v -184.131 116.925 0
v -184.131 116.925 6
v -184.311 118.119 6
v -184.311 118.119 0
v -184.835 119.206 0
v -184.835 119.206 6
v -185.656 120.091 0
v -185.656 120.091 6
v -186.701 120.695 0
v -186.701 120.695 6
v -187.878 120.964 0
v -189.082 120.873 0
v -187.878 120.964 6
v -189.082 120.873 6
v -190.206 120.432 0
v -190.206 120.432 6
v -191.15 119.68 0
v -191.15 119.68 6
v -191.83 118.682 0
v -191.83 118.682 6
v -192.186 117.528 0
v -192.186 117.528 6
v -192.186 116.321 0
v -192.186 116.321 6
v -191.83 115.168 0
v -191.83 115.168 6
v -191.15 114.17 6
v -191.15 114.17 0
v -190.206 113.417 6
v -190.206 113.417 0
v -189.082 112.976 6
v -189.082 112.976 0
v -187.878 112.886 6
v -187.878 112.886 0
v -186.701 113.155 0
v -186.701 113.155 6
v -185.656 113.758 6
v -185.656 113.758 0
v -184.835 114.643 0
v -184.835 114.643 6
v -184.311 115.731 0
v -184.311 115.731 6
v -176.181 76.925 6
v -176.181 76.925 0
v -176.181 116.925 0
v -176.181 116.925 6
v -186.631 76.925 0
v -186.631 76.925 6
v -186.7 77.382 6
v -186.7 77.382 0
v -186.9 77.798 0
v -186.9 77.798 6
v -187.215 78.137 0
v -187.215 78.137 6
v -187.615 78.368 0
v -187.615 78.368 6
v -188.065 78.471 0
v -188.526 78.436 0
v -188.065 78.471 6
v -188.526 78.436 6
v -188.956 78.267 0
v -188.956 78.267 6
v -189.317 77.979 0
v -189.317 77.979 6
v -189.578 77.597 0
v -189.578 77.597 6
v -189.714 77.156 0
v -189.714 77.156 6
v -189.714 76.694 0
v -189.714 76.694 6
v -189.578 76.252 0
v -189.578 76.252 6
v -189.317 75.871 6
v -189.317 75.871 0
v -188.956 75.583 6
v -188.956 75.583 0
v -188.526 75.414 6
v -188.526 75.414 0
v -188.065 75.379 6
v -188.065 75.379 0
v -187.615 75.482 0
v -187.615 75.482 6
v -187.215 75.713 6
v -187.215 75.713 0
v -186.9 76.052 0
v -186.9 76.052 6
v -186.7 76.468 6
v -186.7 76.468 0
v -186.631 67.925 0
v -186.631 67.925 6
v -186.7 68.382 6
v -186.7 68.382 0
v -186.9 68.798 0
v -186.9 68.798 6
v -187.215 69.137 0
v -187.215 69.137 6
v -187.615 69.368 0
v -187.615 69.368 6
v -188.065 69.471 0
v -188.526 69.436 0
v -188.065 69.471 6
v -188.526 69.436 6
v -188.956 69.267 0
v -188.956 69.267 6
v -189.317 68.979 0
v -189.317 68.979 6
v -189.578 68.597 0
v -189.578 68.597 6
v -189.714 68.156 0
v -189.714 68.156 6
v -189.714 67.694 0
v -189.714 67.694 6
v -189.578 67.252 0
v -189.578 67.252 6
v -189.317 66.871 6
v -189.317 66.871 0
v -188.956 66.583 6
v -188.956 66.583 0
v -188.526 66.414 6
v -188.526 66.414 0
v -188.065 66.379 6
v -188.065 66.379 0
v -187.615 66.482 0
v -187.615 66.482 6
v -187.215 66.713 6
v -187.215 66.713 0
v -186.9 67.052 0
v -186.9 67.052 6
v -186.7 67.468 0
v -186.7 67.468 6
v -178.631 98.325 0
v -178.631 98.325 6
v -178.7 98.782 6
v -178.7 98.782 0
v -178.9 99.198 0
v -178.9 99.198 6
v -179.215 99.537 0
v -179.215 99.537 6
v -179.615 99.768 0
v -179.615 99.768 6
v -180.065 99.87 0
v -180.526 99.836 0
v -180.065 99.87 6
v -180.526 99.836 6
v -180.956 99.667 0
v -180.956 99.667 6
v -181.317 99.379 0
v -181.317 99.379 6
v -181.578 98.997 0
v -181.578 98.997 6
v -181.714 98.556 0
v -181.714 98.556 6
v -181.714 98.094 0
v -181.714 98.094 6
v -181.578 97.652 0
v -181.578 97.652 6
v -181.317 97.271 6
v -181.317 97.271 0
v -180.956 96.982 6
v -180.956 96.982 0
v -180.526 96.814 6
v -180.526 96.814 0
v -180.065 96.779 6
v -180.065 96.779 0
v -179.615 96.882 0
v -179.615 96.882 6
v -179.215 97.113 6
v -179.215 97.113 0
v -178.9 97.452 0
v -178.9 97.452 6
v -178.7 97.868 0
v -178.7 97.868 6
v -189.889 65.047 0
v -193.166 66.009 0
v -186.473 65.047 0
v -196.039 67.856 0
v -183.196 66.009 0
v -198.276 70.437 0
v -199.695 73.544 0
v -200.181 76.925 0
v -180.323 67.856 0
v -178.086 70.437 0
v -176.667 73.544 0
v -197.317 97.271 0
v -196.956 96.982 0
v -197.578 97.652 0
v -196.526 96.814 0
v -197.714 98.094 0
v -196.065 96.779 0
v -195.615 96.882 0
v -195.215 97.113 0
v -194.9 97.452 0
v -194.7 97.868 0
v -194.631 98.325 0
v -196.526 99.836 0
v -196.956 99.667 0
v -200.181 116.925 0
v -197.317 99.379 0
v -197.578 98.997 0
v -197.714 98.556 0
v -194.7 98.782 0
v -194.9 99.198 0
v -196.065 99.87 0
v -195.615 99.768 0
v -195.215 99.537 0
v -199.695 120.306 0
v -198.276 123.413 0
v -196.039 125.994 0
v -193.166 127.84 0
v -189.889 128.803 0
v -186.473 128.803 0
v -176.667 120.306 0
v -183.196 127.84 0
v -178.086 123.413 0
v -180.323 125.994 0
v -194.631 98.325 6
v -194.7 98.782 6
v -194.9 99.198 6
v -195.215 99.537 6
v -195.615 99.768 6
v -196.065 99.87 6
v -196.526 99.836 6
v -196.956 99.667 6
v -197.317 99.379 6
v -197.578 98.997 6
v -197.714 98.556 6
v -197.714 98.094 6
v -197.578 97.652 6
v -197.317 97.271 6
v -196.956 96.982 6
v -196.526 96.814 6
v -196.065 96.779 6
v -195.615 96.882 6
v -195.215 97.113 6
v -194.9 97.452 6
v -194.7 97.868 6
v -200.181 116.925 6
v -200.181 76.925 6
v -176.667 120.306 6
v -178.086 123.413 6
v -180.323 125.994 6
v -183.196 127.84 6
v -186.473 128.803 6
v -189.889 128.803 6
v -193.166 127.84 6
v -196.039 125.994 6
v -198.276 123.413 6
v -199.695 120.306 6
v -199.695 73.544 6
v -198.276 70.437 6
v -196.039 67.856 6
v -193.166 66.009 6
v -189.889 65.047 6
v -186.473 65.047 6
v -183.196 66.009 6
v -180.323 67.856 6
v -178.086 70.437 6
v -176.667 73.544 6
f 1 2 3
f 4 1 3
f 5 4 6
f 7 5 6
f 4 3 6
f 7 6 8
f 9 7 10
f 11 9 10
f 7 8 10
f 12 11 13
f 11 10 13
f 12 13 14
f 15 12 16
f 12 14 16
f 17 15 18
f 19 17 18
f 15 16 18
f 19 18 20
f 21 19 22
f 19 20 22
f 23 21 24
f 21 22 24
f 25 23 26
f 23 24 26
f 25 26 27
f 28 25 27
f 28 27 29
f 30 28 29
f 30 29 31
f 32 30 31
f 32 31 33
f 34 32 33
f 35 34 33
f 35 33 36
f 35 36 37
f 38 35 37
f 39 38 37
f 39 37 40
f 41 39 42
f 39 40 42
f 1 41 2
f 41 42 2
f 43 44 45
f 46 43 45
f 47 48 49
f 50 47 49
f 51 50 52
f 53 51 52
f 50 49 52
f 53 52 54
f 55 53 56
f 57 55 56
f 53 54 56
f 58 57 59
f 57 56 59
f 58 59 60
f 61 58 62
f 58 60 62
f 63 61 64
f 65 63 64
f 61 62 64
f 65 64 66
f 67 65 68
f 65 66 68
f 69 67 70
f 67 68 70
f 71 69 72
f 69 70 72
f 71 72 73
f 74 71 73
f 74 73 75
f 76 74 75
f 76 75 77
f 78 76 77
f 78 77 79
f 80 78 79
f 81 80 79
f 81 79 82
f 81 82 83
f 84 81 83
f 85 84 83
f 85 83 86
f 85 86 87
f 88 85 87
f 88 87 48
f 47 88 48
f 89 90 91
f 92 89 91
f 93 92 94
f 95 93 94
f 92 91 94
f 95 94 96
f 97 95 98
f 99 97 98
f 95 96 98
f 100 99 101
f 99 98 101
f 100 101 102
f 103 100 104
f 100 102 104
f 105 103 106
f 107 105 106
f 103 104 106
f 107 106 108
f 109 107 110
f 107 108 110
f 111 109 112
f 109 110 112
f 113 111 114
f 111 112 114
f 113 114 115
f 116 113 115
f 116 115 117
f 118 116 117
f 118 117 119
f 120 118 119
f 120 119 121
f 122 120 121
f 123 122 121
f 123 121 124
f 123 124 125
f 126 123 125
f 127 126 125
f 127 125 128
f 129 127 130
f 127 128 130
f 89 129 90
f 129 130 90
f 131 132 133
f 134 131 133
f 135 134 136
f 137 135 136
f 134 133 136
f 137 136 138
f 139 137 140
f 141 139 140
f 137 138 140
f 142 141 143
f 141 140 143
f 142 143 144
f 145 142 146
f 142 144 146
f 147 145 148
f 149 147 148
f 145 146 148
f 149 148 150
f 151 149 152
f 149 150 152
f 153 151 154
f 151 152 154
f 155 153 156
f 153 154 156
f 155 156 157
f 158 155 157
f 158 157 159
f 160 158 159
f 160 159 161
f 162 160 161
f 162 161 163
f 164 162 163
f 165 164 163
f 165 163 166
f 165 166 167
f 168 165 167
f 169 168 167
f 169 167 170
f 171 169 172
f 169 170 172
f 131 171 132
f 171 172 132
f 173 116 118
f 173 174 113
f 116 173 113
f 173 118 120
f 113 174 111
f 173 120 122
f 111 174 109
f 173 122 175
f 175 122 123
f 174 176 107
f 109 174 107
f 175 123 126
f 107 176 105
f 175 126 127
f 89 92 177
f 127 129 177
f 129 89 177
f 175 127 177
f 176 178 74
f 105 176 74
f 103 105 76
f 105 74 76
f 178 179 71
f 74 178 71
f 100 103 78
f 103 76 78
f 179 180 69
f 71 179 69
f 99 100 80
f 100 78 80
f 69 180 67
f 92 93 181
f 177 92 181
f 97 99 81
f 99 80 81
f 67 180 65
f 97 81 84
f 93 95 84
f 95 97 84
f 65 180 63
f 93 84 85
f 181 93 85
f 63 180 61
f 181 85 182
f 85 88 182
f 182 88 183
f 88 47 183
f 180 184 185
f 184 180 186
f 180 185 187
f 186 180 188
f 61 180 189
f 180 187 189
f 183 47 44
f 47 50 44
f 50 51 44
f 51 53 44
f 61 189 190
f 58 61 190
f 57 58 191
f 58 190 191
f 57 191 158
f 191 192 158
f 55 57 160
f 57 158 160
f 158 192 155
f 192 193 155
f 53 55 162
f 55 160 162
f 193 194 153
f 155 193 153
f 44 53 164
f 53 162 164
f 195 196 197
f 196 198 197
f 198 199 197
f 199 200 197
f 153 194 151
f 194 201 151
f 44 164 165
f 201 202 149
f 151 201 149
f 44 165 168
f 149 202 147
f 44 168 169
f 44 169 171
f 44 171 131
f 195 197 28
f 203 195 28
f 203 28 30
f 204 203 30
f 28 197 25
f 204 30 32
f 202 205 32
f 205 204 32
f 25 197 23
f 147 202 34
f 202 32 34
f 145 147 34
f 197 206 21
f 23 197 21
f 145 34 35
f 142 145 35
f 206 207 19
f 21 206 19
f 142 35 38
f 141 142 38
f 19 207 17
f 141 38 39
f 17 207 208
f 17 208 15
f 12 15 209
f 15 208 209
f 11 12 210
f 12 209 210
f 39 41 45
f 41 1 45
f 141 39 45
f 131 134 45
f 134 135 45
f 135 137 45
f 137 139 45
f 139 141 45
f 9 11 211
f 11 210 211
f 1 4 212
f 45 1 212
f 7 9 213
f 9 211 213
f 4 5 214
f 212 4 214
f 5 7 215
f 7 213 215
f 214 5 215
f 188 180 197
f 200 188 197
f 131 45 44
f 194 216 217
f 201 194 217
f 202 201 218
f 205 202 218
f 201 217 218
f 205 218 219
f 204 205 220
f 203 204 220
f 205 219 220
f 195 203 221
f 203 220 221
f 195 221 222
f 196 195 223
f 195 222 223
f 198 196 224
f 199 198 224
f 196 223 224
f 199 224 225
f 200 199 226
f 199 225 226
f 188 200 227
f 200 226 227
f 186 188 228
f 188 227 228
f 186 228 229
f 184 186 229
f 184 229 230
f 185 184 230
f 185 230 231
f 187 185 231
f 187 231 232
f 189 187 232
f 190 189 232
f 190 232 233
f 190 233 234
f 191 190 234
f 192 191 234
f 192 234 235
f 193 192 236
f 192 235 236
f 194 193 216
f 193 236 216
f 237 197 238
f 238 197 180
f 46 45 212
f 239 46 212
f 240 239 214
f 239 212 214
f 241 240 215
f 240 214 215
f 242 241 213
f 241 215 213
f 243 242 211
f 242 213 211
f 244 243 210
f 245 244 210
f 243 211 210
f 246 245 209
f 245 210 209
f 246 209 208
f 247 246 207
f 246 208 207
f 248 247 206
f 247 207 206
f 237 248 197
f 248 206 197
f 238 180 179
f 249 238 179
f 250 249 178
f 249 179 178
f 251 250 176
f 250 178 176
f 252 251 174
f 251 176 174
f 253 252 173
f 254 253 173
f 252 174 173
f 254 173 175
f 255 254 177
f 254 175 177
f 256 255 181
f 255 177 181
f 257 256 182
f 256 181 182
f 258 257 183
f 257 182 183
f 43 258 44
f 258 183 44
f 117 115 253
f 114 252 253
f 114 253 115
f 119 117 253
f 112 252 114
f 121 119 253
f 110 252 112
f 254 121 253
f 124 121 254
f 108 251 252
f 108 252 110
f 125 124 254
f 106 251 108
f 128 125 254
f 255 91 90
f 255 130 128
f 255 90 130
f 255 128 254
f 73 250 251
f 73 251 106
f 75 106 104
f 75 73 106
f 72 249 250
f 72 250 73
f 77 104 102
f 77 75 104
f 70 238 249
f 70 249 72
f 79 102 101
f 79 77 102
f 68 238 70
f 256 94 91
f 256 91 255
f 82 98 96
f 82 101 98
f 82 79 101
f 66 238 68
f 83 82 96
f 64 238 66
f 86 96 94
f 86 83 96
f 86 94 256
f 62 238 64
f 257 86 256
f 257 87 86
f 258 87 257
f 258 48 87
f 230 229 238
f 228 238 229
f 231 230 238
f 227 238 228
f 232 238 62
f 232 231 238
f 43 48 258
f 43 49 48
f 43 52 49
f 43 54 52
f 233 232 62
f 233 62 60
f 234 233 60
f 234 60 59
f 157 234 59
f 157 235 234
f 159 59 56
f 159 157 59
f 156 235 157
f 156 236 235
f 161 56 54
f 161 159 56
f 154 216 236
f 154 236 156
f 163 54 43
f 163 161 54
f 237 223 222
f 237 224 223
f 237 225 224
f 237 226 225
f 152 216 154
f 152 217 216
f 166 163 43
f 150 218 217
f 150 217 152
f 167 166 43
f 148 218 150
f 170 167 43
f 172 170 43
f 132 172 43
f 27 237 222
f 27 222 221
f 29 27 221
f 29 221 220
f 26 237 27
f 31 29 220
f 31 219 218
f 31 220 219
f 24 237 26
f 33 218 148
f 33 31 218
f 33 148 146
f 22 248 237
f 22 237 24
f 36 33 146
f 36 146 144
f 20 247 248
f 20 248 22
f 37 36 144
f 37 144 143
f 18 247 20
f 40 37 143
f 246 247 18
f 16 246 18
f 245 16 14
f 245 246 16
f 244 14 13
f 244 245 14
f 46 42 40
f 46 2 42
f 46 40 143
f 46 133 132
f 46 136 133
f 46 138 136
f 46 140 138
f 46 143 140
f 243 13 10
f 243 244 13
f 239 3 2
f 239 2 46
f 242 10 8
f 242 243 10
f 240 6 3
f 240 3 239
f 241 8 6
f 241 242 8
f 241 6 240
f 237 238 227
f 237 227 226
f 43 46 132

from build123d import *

# Parameters (mm, degrees)
DODANIE_WYCI_GNI_CIE1_DEPTH = 6
SZKIC2_R                    = 1.55
WYTNIJ_WYCI_GNI_CIE1_DEPTH  = 6
SZKIC5_R                    = 4.05
WYTNIJ_WYCI_GNI_CIE3_DEPTH  = 6
SZKIC7_R                    = 1.55
WYTNIJ_WYCI_GNI_CIE5_DEPTH  = 10


with BuildPart() as part:
    # Szkic1 → Dodanie-wyciągnięcie1 (new body)
    with BuildSketch(Plane.XY):
        with BuildLine():
            Line((-200.181077779, 116.924844228), (-200.181077779, 76.924846477))
            ThreePointArc((-200.181077779, 76.924846477), (-188.181077779, 64.924846477), (-176.181077779, 76.924846477))
            Line((-176.181077779, 76.924846477), (-176.181077779, 116.924844163))
            ThreePointArc((-176.181077779, 116.924844163), (-188.181077747, 128.924846477), (-200.181077779, 116.924844228))
        make_face()
    extrude(amount=DODANIE_WYCI_GNI_CIE1_DEPTH)

    # Szkic2 → Wytnij-wyciągnięcie1 (cut)
    with BuildSketch(Plane.XY.offset(6)):
        with Locations((-196.181077779, 98.324819795)):
            Circle(SZKIC2_R)
        with Locations((-180.181077779, 98.324819795)):
            Circle(SZKIC2_R)
        with Locations((-188.181077779, 67.924846477)):
            Circle(SZKIC2_R)
    extrude(amount=-WYTNIJ_WYCI_GNI_CIE1_DEPTH, mode=Mode.SUBTRACT)

    # Szkic5 → Wytnij-wyciągnięcie3 (cut)
    with BuildSketch(Plane.XY.offset(6)):
        with Locations((-188.181077779, 116.924846477)):
            Circle(SZKIC5_R)
    extrude(amount=-WYTNIJ_WYCI_GNI_CIE3_DEPTH, mode=Mode.SUBTRACT)

    # Szkic7 → Wytnij-wyciągnięcie5 (cut)
    with BuildSketch(Plane.XY.offset(6)):
        with Locations((-188.181077779, 76.924846477)):
            Circle(SZKIC7_R)
    extrude(amount=-WYTNIJ_WYCI_GNI_CIE5_DEPTH, mode=Mode.SUBTRACT)


solid = part.part
